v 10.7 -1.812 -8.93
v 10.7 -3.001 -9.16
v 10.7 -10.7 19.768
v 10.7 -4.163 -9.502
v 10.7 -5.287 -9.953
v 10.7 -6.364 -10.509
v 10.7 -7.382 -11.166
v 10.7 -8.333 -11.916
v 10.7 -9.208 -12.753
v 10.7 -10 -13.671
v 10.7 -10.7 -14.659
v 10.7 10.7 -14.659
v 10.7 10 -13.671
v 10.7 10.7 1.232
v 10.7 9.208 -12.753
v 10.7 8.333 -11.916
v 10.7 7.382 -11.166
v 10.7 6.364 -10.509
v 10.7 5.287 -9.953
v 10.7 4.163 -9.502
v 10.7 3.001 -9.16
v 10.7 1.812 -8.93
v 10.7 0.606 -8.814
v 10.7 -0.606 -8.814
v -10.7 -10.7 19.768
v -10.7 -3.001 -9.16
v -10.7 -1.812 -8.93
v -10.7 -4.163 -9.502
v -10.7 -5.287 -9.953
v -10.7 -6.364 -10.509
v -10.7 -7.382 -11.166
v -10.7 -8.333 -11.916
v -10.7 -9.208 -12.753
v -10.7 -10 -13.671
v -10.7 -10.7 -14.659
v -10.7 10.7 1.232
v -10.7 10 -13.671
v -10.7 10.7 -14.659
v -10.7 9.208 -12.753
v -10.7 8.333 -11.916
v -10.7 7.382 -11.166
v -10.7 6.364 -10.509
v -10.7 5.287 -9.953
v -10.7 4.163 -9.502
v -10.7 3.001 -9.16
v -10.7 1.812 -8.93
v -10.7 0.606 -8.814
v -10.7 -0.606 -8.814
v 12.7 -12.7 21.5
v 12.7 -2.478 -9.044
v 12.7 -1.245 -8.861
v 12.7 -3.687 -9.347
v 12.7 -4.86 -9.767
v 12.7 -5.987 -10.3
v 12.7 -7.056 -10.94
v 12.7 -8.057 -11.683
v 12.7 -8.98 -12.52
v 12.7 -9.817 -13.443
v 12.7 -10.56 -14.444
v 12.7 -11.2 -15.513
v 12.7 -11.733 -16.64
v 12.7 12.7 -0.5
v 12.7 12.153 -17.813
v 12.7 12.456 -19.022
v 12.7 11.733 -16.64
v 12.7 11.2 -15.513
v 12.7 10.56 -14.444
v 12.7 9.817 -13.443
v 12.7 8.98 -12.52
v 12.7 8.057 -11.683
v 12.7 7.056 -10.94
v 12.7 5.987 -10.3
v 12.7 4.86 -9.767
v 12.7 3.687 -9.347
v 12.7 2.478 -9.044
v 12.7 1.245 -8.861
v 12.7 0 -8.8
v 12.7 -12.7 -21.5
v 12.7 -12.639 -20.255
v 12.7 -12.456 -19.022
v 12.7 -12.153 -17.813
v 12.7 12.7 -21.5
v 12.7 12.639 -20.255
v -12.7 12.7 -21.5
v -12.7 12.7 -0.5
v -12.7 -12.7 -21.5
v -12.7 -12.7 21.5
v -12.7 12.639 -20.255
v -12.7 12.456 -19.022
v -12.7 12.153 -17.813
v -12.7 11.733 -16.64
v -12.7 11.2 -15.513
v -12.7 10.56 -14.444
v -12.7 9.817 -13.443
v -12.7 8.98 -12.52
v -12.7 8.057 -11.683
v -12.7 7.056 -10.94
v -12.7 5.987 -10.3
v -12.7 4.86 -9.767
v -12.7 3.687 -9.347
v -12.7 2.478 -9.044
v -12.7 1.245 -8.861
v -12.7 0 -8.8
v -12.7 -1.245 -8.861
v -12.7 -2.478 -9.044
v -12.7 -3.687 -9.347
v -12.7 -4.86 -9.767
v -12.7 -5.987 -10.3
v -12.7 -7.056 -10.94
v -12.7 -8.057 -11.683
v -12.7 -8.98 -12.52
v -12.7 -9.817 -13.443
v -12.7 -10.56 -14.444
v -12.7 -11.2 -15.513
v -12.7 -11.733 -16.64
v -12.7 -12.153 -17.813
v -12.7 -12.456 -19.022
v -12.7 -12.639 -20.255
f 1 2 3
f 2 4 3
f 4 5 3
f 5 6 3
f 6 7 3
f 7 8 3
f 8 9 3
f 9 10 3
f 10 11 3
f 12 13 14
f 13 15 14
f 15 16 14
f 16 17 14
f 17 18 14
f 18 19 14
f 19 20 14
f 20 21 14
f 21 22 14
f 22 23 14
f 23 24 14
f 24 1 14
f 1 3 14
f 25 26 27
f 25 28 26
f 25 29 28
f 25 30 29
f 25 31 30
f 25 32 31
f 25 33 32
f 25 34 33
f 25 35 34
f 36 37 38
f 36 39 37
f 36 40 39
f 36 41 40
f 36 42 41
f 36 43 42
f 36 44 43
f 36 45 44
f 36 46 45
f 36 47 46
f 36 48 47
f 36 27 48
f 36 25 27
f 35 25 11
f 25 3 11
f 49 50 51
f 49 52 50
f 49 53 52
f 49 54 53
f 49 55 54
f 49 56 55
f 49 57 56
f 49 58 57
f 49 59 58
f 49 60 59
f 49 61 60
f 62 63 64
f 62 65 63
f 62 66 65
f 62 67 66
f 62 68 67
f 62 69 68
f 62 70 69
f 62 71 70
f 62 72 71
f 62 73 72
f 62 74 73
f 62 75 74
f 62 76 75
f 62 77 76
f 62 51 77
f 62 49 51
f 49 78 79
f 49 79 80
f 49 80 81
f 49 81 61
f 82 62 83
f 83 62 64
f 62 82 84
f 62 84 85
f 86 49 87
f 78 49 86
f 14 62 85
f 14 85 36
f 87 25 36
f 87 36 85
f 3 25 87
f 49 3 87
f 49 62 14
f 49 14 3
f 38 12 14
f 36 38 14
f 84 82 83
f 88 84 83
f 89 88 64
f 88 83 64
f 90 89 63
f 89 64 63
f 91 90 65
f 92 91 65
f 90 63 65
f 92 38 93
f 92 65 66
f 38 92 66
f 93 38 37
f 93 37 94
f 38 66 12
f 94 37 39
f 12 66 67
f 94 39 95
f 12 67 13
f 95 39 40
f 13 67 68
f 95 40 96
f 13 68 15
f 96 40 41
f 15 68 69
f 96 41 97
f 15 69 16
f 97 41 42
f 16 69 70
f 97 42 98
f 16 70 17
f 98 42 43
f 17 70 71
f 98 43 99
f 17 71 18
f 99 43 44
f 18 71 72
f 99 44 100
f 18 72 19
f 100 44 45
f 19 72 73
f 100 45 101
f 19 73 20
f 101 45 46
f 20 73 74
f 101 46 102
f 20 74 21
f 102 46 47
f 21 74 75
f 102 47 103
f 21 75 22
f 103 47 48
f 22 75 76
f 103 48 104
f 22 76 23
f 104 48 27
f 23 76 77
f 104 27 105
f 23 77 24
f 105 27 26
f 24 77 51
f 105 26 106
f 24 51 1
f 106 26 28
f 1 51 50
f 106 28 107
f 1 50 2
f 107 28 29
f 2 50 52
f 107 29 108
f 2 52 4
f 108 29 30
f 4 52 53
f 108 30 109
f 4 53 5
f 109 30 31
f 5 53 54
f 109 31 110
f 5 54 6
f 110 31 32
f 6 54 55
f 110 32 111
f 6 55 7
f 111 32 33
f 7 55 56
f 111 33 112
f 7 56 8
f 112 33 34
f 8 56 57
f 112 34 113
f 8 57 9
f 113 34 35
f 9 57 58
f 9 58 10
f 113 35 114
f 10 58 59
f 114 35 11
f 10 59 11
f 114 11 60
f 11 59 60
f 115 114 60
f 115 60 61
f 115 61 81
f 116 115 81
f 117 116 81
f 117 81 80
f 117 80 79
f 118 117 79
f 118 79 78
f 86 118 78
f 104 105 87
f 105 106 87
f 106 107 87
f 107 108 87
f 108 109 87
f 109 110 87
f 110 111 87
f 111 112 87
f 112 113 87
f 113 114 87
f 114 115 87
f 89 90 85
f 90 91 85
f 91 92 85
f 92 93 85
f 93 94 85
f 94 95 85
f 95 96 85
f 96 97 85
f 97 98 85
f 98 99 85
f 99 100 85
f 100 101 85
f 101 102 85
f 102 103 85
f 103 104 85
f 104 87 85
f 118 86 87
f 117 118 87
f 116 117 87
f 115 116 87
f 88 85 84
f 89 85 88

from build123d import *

# Parameters (mm, degrees)
F1_DEPTH = 12.7
F2_T     = -2
F4_DEPTH = 29.083


with BuildPart() as f1:
    # F0 (on Right) → F1 (new body, symmetric)
    with BuildSketch(Plane.YZ):
        Polygon((-12.7, 21.5), (-12.7, -21.5), (12.7, -21.5), (12.7, -0.5), align=None)
    extrude(amount=F1_DEPTH, both=True)

    # F2
    f2_openings = [f1.faces().sort_by_distance(p)[0] for p in [
        (0, 0, -21.5),
        (0, 0, 10.5),
    ]]
    offset(amount=F2_T, openings=f2_openings)

    # F3 (on face) → F4 (cut)
    with BuildSketch(Plane.YZ.offset(12.7)):
        with BuildLine():
            Line((-12.7, -21.5), (12.7, -21.5))
            ThreePointArc((12.7, -21.5), (0, -8.8), (-12.7, -21.5))
        make_face()
    extrude(amount=-F4_DEPTH, mode=Mode.SUBTRACT)


solid = f1.part
